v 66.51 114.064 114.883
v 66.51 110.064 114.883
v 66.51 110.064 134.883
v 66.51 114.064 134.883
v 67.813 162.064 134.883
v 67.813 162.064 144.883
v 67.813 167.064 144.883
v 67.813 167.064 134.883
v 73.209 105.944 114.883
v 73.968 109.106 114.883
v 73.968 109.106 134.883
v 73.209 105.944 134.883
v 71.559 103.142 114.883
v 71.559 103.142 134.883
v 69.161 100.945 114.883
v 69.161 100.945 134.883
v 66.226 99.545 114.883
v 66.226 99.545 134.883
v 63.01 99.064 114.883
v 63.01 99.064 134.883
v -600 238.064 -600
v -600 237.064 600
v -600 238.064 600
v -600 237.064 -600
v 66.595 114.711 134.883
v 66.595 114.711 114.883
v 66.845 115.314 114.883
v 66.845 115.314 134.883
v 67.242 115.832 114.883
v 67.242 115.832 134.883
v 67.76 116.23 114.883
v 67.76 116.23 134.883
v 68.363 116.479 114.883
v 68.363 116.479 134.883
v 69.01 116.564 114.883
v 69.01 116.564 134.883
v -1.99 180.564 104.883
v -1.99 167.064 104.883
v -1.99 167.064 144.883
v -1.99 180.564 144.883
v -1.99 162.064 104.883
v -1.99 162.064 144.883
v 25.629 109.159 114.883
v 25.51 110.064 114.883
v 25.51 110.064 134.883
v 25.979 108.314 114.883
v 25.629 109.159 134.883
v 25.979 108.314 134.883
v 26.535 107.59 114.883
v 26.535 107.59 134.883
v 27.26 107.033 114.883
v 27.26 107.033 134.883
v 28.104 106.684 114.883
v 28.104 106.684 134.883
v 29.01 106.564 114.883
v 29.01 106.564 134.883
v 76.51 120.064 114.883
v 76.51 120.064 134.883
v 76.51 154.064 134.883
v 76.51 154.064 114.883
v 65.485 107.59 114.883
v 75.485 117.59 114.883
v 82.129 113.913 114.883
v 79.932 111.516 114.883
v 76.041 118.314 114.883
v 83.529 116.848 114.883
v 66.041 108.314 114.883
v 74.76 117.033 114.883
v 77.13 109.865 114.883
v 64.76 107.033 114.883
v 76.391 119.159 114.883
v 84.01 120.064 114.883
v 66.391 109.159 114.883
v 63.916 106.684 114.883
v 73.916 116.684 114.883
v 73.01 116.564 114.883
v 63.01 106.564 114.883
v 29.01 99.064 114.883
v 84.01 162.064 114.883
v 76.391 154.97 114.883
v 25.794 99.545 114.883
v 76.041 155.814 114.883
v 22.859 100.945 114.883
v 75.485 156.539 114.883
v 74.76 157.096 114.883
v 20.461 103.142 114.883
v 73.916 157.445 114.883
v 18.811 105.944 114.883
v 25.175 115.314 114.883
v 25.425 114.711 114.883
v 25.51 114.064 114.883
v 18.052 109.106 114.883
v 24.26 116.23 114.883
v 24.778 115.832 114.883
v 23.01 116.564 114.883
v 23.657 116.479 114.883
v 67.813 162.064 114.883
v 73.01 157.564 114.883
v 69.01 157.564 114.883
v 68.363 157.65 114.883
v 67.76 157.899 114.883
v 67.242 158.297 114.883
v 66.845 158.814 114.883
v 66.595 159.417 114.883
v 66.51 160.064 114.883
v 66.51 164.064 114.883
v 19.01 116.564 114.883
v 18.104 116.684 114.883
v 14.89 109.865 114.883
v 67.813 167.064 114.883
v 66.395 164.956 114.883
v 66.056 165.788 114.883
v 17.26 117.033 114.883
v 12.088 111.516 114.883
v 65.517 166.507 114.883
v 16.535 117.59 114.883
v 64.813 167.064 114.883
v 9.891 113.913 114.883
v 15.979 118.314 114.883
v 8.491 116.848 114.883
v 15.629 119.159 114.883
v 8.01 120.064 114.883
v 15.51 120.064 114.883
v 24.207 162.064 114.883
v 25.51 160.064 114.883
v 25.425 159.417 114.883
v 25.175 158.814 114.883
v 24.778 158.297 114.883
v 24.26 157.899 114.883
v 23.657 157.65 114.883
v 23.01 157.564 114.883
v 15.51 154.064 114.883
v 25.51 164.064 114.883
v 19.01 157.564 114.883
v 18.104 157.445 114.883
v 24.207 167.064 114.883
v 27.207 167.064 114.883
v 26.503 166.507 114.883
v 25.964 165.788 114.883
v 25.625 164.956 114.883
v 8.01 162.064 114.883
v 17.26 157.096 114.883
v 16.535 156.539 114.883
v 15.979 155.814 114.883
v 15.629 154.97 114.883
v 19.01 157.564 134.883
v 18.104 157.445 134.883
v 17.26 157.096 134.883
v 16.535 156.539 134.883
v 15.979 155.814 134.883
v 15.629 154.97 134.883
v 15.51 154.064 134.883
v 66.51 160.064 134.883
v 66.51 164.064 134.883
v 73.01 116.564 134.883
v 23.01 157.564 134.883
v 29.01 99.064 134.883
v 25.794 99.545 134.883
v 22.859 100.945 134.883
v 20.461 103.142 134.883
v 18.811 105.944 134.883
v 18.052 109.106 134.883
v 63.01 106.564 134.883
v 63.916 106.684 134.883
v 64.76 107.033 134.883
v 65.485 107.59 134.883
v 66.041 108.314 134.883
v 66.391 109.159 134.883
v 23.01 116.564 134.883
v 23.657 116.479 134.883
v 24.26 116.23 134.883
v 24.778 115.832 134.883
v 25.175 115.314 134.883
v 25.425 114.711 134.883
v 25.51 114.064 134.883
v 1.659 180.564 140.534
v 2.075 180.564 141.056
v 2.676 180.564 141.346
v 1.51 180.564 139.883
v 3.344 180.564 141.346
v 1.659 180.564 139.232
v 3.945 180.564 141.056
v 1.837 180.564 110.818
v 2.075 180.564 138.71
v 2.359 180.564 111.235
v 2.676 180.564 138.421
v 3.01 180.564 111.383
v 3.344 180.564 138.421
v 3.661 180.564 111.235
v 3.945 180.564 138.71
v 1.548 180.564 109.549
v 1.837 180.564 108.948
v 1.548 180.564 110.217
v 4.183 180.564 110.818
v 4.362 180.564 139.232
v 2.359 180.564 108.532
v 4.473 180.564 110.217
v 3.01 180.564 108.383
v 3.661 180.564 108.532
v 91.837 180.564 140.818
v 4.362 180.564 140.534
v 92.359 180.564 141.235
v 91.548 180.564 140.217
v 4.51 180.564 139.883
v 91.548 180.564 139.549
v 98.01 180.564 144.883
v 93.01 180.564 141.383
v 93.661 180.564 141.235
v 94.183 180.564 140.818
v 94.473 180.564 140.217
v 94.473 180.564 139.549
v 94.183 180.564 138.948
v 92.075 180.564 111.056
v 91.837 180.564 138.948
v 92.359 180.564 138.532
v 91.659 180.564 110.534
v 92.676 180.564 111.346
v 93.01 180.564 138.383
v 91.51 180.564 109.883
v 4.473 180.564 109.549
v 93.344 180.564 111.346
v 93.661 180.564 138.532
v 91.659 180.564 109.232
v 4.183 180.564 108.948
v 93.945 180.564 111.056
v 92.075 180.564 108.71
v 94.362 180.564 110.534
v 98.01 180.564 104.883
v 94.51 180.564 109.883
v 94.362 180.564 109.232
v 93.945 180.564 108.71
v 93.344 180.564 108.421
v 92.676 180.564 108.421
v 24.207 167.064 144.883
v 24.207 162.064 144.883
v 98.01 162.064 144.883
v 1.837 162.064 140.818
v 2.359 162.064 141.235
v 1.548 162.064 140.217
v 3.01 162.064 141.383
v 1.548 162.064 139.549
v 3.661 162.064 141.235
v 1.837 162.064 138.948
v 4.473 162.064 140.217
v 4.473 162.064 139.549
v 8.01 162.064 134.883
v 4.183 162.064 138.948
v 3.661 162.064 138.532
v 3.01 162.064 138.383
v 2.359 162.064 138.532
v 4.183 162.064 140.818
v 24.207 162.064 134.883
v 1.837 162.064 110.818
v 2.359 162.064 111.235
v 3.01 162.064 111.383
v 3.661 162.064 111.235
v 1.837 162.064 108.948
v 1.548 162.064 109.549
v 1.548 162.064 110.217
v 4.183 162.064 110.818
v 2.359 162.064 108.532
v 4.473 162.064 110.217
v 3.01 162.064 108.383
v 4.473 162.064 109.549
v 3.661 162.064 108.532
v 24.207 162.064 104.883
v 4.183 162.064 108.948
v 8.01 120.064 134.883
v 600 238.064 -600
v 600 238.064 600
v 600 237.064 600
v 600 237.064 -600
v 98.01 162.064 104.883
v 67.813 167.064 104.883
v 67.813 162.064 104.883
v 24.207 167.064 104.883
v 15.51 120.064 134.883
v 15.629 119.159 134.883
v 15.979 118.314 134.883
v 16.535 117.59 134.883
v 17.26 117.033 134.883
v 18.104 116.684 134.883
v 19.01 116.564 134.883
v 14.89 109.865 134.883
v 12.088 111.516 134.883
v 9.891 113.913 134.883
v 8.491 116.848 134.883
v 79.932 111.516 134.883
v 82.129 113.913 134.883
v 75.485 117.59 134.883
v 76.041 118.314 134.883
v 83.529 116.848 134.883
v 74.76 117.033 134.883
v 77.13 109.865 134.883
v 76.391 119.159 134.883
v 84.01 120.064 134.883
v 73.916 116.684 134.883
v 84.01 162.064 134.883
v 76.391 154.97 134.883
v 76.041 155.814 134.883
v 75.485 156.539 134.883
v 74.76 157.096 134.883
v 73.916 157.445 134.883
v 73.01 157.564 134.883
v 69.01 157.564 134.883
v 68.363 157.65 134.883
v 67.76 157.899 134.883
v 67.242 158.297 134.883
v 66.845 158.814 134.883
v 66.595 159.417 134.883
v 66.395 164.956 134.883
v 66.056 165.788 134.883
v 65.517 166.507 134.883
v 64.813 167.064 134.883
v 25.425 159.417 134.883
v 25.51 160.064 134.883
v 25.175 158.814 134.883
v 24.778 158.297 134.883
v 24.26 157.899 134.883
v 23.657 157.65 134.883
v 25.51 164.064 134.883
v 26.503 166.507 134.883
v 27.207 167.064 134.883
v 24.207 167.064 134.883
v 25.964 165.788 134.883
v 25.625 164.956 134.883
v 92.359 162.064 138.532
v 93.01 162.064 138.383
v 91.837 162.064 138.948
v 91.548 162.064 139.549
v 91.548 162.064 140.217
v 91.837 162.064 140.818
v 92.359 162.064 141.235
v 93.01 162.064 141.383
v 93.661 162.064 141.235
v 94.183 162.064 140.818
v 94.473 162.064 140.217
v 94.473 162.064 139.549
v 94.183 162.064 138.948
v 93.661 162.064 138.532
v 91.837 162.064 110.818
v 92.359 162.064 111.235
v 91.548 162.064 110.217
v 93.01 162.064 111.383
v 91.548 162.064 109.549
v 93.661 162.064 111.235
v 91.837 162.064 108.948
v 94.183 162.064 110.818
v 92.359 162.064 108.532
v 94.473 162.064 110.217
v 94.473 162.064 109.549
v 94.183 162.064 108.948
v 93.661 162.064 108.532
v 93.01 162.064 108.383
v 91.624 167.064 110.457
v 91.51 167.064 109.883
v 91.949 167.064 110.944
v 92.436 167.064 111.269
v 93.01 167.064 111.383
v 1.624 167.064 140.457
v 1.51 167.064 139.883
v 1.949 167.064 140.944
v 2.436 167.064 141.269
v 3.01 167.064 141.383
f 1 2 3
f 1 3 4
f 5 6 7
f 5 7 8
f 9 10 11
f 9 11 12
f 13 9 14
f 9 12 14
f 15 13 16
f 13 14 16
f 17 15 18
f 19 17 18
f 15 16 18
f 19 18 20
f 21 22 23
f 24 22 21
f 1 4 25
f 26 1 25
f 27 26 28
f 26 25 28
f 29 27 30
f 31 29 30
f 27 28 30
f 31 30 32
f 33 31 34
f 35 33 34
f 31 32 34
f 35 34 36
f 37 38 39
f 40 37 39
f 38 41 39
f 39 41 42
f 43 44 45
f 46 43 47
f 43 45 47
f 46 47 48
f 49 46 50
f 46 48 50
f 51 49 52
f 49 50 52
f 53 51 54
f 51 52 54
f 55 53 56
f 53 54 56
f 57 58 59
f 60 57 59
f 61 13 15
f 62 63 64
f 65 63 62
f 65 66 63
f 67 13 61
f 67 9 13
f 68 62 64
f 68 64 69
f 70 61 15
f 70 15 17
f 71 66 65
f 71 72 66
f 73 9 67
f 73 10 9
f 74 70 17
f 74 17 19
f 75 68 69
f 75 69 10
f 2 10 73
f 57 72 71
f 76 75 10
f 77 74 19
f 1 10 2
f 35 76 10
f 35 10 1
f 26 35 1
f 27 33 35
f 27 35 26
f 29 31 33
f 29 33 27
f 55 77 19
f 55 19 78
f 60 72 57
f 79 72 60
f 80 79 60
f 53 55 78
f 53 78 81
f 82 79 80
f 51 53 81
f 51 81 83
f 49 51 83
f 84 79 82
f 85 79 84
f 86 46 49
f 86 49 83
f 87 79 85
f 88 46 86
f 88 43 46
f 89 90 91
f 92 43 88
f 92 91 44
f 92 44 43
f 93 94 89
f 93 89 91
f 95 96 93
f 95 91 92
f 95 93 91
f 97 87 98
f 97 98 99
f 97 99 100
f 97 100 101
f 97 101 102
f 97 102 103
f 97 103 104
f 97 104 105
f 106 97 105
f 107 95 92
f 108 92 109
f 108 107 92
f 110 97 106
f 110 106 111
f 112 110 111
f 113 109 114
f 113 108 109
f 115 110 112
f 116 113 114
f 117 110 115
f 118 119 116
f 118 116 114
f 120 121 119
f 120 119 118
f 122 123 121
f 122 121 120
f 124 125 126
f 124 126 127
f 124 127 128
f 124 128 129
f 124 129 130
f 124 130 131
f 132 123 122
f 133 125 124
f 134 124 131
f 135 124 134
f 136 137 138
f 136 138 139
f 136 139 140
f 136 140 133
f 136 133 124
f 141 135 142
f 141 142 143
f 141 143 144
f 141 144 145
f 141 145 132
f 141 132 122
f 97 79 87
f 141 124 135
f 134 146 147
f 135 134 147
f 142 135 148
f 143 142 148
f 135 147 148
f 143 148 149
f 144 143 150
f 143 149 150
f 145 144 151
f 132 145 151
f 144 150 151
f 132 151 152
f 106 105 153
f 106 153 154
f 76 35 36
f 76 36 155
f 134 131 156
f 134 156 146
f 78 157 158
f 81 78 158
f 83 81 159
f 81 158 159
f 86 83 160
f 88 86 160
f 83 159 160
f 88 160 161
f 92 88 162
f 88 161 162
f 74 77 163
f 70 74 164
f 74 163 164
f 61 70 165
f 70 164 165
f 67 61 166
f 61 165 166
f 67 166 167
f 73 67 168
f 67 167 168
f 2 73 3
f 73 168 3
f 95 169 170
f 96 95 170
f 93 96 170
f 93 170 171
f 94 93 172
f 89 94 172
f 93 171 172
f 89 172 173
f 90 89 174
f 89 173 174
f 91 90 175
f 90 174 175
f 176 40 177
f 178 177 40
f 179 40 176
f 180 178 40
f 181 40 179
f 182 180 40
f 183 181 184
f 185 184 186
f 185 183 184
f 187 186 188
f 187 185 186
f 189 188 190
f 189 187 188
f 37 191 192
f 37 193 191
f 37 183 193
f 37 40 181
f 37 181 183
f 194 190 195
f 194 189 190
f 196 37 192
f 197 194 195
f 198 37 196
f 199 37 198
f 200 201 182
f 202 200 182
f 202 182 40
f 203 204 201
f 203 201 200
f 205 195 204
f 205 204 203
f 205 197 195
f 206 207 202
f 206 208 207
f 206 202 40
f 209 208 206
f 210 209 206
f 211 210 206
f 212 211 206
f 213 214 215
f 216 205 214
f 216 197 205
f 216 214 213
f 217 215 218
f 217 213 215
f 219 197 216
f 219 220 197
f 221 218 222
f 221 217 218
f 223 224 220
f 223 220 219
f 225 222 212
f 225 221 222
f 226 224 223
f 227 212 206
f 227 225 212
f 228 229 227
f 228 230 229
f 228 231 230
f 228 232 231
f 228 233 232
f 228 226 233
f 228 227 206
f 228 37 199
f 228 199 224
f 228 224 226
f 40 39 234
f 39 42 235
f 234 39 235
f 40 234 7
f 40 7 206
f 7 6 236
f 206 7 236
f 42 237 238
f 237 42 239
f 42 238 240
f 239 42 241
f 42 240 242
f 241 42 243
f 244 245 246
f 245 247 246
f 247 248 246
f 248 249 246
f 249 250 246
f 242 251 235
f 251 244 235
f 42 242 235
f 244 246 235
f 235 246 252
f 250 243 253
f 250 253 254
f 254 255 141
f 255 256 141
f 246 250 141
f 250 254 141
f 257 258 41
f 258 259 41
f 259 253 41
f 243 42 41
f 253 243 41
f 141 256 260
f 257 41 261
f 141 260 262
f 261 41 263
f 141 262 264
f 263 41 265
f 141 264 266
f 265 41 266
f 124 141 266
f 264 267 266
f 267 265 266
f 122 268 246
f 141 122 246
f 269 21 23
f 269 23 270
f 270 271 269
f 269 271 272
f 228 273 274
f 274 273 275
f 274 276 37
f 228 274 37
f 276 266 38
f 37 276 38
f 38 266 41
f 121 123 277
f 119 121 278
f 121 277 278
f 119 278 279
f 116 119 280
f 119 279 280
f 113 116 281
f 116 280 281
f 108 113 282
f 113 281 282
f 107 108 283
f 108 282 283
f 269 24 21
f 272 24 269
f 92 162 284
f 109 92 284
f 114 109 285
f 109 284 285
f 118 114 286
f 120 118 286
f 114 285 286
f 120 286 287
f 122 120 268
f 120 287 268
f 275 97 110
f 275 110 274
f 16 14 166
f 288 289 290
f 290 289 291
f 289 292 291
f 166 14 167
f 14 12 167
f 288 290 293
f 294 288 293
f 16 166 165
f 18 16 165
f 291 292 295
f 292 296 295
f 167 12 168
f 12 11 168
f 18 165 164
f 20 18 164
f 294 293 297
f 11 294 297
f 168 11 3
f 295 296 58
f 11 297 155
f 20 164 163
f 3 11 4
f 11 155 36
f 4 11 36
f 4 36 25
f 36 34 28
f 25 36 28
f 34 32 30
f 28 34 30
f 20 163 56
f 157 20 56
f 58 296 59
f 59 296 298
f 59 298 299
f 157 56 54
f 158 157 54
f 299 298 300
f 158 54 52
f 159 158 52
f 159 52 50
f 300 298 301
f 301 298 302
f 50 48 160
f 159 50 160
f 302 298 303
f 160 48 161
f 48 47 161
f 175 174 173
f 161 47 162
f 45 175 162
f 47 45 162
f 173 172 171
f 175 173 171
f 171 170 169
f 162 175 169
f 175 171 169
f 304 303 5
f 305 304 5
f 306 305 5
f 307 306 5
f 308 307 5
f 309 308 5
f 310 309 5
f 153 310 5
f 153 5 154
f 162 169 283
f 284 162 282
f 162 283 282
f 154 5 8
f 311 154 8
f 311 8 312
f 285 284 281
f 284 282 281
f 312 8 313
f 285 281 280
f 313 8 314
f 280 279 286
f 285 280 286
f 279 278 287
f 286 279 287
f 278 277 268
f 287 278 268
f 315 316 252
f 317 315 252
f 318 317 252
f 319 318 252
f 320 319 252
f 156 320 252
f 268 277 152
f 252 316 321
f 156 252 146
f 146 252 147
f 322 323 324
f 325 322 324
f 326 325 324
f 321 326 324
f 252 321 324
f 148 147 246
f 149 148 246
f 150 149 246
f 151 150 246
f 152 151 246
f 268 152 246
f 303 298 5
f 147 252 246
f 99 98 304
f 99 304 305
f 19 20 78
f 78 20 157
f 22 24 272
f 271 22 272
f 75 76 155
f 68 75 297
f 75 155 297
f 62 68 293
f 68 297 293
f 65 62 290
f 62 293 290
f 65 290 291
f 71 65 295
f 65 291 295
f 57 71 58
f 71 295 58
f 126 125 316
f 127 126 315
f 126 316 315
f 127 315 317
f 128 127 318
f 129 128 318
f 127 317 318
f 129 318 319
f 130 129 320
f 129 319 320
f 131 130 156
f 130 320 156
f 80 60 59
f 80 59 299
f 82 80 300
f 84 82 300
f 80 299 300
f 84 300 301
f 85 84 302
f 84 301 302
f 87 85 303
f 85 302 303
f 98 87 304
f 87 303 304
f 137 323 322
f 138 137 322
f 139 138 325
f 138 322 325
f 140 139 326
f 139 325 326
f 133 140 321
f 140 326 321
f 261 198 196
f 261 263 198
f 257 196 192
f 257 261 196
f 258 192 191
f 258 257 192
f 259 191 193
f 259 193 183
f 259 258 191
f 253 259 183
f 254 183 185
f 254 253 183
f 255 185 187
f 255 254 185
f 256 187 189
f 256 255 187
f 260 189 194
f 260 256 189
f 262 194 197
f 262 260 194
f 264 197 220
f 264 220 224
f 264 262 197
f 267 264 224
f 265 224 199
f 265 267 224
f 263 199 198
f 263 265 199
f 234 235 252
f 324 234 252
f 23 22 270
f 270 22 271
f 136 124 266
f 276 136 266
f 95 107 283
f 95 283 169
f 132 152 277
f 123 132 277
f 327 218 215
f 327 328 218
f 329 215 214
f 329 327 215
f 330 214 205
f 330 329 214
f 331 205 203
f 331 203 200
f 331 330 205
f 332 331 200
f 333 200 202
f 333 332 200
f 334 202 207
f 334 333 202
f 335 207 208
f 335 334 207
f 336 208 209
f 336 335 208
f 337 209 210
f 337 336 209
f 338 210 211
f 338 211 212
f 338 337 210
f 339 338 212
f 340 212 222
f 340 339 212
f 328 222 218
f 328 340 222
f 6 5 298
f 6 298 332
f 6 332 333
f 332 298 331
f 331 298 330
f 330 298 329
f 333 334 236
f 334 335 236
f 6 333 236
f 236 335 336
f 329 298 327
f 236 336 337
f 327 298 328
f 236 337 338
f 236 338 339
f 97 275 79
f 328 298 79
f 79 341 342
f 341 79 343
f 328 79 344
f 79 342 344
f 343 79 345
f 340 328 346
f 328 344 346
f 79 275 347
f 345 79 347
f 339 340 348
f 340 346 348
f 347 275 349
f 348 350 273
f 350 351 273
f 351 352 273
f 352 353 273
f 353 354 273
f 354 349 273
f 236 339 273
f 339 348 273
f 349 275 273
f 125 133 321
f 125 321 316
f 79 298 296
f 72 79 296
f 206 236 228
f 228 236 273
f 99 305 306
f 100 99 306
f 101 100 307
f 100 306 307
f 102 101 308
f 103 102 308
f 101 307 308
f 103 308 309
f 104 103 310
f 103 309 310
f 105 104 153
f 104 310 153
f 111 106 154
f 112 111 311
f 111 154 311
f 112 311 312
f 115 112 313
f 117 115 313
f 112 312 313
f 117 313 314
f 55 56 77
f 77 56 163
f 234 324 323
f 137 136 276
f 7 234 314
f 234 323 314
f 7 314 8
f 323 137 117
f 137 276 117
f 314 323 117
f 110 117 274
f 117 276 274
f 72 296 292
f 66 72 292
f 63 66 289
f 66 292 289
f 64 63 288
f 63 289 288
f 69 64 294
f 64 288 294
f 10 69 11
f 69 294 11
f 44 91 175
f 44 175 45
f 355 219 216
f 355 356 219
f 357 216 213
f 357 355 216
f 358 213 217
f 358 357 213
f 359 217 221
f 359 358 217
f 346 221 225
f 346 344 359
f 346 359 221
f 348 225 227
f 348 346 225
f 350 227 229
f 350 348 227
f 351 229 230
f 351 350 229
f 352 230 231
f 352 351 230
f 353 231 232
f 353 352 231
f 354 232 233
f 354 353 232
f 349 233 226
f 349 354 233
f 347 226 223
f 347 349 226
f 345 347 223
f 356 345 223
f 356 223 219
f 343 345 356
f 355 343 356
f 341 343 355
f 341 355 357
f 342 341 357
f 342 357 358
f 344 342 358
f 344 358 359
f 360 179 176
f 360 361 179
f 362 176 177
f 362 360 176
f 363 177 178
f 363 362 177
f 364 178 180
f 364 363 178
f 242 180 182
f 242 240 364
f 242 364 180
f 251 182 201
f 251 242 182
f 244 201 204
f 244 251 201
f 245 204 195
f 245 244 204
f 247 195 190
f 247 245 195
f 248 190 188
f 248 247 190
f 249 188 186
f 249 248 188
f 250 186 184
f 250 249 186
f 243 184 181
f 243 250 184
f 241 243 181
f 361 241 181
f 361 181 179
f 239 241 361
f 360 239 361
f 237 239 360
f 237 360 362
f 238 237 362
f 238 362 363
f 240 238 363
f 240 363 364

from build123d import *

# Parameters (mm, degrees)
BOSS_EXTRUDE1_DEPTH = 20
BOSS_EXTRUDE2_START = -5
SKETCH3_W           = 26.197224363
SKETCH3_H           = 40
SKETCH3_R           = 1.5
SKETCH3_W_2         = 30.197224362
BOSS_EXTRUDE2_DEPTH = 5
SKETCH4_W           = 1200
SKETCH4_H           = 1200
BOSS_EXTRUDE3_DEPTH = 1
SKETCH5_R           = 1.5
BOSS_EXTRUDE4_DEPTH = 13.5


with BuildPart() as part:
    # Sketch2 → Boss-Extrude1 (new body)
    with BuildSketch(Plane(origin=(0, 0, 134.88320255), x_dir=(-1, 0, 0), z_dir=(0, 0, -1))):
        with BuildLine():
            Line((-8.010113394, 167.06443927), (-27.207337757, 167.06443927))
            ThreePointArc((-27.207337757, 167.06443927), (-25.963827563, 165.787849446), (-25.510113394, 164.06443927))
            Line((-25.510113394, 164.06443927), (-25.510113394, 160.06443927))
            ThreePointArc((-25.510113394, 160.06443927), (-24.777880347, 158.296672317), (-23.010113394, 157.56443927))
            Line((-23.010113394, 157.56443927), (-19.010113394, 157.56443927))
            ThreePointArc((-19.010113394, 157.56443927), (-16.53523966, 156.539313005), (-15.510113394, 154.06443927))
            Line((-15.510113394, 154.06443927), (-15.510113394, 120.06443927))
            ThreePointArc((-15.510113394, 120.06443927), (-16.53523966, 117.589565536), (-19.010113394, 116.56443927))
            Line((-19.010113394, 116.56443927), (-23.010113394, 116.56443927))
            ThreePointArc((-23.010113394, 116.56443927), (-24.777880347, 115.832206223), (-25.510113394, 114.06443927))
            Line((-25.510113394, 114.06443927), (-25.510113394, 110.06443927))
            ThreePointArc((-25.510113394, 110.06443927), (-26.53523966, 107.589565536), (-29.010113394, 106.56443927))
            Line((-29.010113394, 106.56443927), (-63.010113394, 106.56443927))
            ThreePointArc((-63.010113394, 106.56443927), (-65.484987129, 107.589565536), (-66.510113394, 110.06443927))
            Line((-66.510113394, 110.06443927), (-66.510113394, 114.06443927))
            ThreePointArc((-66.510113394, 114.06443927), (-67.242346441, 115.832206223), (-69.010113394, 116.56443927))
            Line((-69.010113394, 116.56443927), (-73.010113394, 116.56443927))
            ThreePointArc((-73.010113394, 116.56443927), (-75.484987129, 117.589565536), (-76.510113394, 120.06443927))
            Line((-76.510113394, 120.06443927), (-76.510113394, 154.06443927))
            ThreePointArc((-76.510113394, 154.06443927), (-75.484987129, 156.539313005), (-73.010113394, 157.56443927))
            Line((-73.010113394, 157.56443927), (-69.010113394, 157.56443927))
            ThreePointArc((-69.010113394, 157.56443927), (-67.242346441, 158.296672317), (-66.510113394, 160.06443927))
            Line((-66.510113394, 160.06443927), (-66.510113394, 164.06443927))
            ThreePointArc((-66.510113394, 164.06443927), (-66.056399226, 165.787849446), (-64.812889032, 167.06443927))
            Line((-64.812889032, 167.06443927), (-84.010113394, 167.06443927))
            Line((-84.010113394, 167.06443927), (-84.010113394, 154.06443927))
            Line((-84.010113394, 154.06443927), (-84.010113394, 120.06443927))
            ThreePointArc((-84.010113394, 120.06443927), (-81.119985899, 112.63275252), (-73.968301038, 109.106251627))
            ThreePointArc((-73.968301038, 109.106251627), (-70.441800145, 101.954566766), (-63.010113394, 99.06443927))
            Line((-63.010113394, 99.06443927), (-29.010113394, 99.06443927))
            ThreePointArc((-29.010113394, 99.06443927), (-21.578426644, 101.954566766), (-18.051925751, 109.106251627))
            ThreePointArc((-18.051925751, 109.106251627), (-10.90024089, 112.63275252), (-8.010113394, 120.06443927))
            Line((-8.010113394, 120.06443927), (-8.010113394, 154.06443927))
            Line((-8.010113394, 154.06443927), (-8.010113394, 167.06443927))
        make_face()
    extrude(amount=BOSS_EXTRUDE1_DEPTH)

    # Sketch3 → Boss-Extrude2 (add)
    # profile 1 of 2: a face of its own
    with BuildSketch(Plane(origin=(0, 167.06443927, 0), x_dir=(1, 0, 0), z_dir=(0, 1, 0)).offset(BOSS_EXTRUDE2_START)):
        with Locations((11.108725576, -124.88320255)):
            Rectangle(SKETCH3_W, SKETCH3_H)
        with Locations(Location((3.010113394, -139.88320255, 0), (0, 0, 270))):
            Circle(SKETCH3_R, mode=Mode.SUBTRACT)
        with Locations(Location((3.010113394, -109.88320255, 0), (0, 0, 90))):
            Circle(SKETCH3_R, mode=Mode.SUBTRACT)
    # profile 2 of 2: a face of its own
    with BuildSketch(Plane(origin=(0, 167.06443927, 0), x_dir=(1, 0, 0), z_dir=(0, 1, 0)).offset(BOSS_EXTRUDE2_START)):
        with Locations((82.911501213, -124.88320255)):
            Rectangle(SKETCH3_W_2, SKETCH3_H)
        with Locations(Location((93.010113394, -109.88320255, 0), (0, 0, 270))):
            Circle(SKETCH3_R, mode=Mode.SUBTRACT)
        with Locations(Location((93.010113394, -139.88320255, 0), (0, 0, 90))):
            Circle(SKETCH3_R, mode=Mode.SUBTRACT)
    extrude(amount=BOSS_EXTRUDE2_DEPTH)

    # Sketch5 → Boss-Extrude4 (add)
    with BuildSketch(Plane(origin=(0, 167.06443927, 0), x_dir=(1, 0, 0), z_dir=(0, 1, 0))):
        Polygon((98.010113394, -144.88320255), (98.010113394, -104.88320255), (67.812889032, -104.88320255), (24.207337757, -104.88320255), (-1.989886606, -104.88320255), (-1.989886606, -144.88320255), (24.207337757, -144.88320255), (67.812889032, -144.88320255), align=None)
        with Locations(Location((93.010113394, -139.88320255, 0), (0, 0, 90))):
            Circle(SKETCH5_R, mode=Mode.SUBTRACT)
        with Locations(Location((93.010113394, -109.88320255, 0), (0, 0, 180))):
            Circle(SKETCH5_R, mode=Mode.SUBTRACT)
        with Locations(Location((3.010113394, -139.88320255, 0), (0, 0, 180))):
            Circle(SKETCH5_R, mode=Mode.SUBTRACT)
        with Locations(Location((3.010113394, -109.88320255, 0), (0, 0, 90))):
            Circle(SKETCH5_R, mode=Mode.SUBTRACT)
    extrude(amount=BOSS_EXTRUDE4_DEPTH)


with BuildPart() as body_2:
    # Sketch4 → Boss-Extrude3 (new body)
    with BuildSketch(Plane(origin=(0, 237.06443927, 0), x_dir=(1, 0, 0), z_dir=(0, 1, 0))):
        Rectangle(SKETCH4_W, SKETCH4_H)
    extrude(amount=BOSS_EXTRUDE3_DEPTH)


solid = Compound([part.part, body_2.part])
